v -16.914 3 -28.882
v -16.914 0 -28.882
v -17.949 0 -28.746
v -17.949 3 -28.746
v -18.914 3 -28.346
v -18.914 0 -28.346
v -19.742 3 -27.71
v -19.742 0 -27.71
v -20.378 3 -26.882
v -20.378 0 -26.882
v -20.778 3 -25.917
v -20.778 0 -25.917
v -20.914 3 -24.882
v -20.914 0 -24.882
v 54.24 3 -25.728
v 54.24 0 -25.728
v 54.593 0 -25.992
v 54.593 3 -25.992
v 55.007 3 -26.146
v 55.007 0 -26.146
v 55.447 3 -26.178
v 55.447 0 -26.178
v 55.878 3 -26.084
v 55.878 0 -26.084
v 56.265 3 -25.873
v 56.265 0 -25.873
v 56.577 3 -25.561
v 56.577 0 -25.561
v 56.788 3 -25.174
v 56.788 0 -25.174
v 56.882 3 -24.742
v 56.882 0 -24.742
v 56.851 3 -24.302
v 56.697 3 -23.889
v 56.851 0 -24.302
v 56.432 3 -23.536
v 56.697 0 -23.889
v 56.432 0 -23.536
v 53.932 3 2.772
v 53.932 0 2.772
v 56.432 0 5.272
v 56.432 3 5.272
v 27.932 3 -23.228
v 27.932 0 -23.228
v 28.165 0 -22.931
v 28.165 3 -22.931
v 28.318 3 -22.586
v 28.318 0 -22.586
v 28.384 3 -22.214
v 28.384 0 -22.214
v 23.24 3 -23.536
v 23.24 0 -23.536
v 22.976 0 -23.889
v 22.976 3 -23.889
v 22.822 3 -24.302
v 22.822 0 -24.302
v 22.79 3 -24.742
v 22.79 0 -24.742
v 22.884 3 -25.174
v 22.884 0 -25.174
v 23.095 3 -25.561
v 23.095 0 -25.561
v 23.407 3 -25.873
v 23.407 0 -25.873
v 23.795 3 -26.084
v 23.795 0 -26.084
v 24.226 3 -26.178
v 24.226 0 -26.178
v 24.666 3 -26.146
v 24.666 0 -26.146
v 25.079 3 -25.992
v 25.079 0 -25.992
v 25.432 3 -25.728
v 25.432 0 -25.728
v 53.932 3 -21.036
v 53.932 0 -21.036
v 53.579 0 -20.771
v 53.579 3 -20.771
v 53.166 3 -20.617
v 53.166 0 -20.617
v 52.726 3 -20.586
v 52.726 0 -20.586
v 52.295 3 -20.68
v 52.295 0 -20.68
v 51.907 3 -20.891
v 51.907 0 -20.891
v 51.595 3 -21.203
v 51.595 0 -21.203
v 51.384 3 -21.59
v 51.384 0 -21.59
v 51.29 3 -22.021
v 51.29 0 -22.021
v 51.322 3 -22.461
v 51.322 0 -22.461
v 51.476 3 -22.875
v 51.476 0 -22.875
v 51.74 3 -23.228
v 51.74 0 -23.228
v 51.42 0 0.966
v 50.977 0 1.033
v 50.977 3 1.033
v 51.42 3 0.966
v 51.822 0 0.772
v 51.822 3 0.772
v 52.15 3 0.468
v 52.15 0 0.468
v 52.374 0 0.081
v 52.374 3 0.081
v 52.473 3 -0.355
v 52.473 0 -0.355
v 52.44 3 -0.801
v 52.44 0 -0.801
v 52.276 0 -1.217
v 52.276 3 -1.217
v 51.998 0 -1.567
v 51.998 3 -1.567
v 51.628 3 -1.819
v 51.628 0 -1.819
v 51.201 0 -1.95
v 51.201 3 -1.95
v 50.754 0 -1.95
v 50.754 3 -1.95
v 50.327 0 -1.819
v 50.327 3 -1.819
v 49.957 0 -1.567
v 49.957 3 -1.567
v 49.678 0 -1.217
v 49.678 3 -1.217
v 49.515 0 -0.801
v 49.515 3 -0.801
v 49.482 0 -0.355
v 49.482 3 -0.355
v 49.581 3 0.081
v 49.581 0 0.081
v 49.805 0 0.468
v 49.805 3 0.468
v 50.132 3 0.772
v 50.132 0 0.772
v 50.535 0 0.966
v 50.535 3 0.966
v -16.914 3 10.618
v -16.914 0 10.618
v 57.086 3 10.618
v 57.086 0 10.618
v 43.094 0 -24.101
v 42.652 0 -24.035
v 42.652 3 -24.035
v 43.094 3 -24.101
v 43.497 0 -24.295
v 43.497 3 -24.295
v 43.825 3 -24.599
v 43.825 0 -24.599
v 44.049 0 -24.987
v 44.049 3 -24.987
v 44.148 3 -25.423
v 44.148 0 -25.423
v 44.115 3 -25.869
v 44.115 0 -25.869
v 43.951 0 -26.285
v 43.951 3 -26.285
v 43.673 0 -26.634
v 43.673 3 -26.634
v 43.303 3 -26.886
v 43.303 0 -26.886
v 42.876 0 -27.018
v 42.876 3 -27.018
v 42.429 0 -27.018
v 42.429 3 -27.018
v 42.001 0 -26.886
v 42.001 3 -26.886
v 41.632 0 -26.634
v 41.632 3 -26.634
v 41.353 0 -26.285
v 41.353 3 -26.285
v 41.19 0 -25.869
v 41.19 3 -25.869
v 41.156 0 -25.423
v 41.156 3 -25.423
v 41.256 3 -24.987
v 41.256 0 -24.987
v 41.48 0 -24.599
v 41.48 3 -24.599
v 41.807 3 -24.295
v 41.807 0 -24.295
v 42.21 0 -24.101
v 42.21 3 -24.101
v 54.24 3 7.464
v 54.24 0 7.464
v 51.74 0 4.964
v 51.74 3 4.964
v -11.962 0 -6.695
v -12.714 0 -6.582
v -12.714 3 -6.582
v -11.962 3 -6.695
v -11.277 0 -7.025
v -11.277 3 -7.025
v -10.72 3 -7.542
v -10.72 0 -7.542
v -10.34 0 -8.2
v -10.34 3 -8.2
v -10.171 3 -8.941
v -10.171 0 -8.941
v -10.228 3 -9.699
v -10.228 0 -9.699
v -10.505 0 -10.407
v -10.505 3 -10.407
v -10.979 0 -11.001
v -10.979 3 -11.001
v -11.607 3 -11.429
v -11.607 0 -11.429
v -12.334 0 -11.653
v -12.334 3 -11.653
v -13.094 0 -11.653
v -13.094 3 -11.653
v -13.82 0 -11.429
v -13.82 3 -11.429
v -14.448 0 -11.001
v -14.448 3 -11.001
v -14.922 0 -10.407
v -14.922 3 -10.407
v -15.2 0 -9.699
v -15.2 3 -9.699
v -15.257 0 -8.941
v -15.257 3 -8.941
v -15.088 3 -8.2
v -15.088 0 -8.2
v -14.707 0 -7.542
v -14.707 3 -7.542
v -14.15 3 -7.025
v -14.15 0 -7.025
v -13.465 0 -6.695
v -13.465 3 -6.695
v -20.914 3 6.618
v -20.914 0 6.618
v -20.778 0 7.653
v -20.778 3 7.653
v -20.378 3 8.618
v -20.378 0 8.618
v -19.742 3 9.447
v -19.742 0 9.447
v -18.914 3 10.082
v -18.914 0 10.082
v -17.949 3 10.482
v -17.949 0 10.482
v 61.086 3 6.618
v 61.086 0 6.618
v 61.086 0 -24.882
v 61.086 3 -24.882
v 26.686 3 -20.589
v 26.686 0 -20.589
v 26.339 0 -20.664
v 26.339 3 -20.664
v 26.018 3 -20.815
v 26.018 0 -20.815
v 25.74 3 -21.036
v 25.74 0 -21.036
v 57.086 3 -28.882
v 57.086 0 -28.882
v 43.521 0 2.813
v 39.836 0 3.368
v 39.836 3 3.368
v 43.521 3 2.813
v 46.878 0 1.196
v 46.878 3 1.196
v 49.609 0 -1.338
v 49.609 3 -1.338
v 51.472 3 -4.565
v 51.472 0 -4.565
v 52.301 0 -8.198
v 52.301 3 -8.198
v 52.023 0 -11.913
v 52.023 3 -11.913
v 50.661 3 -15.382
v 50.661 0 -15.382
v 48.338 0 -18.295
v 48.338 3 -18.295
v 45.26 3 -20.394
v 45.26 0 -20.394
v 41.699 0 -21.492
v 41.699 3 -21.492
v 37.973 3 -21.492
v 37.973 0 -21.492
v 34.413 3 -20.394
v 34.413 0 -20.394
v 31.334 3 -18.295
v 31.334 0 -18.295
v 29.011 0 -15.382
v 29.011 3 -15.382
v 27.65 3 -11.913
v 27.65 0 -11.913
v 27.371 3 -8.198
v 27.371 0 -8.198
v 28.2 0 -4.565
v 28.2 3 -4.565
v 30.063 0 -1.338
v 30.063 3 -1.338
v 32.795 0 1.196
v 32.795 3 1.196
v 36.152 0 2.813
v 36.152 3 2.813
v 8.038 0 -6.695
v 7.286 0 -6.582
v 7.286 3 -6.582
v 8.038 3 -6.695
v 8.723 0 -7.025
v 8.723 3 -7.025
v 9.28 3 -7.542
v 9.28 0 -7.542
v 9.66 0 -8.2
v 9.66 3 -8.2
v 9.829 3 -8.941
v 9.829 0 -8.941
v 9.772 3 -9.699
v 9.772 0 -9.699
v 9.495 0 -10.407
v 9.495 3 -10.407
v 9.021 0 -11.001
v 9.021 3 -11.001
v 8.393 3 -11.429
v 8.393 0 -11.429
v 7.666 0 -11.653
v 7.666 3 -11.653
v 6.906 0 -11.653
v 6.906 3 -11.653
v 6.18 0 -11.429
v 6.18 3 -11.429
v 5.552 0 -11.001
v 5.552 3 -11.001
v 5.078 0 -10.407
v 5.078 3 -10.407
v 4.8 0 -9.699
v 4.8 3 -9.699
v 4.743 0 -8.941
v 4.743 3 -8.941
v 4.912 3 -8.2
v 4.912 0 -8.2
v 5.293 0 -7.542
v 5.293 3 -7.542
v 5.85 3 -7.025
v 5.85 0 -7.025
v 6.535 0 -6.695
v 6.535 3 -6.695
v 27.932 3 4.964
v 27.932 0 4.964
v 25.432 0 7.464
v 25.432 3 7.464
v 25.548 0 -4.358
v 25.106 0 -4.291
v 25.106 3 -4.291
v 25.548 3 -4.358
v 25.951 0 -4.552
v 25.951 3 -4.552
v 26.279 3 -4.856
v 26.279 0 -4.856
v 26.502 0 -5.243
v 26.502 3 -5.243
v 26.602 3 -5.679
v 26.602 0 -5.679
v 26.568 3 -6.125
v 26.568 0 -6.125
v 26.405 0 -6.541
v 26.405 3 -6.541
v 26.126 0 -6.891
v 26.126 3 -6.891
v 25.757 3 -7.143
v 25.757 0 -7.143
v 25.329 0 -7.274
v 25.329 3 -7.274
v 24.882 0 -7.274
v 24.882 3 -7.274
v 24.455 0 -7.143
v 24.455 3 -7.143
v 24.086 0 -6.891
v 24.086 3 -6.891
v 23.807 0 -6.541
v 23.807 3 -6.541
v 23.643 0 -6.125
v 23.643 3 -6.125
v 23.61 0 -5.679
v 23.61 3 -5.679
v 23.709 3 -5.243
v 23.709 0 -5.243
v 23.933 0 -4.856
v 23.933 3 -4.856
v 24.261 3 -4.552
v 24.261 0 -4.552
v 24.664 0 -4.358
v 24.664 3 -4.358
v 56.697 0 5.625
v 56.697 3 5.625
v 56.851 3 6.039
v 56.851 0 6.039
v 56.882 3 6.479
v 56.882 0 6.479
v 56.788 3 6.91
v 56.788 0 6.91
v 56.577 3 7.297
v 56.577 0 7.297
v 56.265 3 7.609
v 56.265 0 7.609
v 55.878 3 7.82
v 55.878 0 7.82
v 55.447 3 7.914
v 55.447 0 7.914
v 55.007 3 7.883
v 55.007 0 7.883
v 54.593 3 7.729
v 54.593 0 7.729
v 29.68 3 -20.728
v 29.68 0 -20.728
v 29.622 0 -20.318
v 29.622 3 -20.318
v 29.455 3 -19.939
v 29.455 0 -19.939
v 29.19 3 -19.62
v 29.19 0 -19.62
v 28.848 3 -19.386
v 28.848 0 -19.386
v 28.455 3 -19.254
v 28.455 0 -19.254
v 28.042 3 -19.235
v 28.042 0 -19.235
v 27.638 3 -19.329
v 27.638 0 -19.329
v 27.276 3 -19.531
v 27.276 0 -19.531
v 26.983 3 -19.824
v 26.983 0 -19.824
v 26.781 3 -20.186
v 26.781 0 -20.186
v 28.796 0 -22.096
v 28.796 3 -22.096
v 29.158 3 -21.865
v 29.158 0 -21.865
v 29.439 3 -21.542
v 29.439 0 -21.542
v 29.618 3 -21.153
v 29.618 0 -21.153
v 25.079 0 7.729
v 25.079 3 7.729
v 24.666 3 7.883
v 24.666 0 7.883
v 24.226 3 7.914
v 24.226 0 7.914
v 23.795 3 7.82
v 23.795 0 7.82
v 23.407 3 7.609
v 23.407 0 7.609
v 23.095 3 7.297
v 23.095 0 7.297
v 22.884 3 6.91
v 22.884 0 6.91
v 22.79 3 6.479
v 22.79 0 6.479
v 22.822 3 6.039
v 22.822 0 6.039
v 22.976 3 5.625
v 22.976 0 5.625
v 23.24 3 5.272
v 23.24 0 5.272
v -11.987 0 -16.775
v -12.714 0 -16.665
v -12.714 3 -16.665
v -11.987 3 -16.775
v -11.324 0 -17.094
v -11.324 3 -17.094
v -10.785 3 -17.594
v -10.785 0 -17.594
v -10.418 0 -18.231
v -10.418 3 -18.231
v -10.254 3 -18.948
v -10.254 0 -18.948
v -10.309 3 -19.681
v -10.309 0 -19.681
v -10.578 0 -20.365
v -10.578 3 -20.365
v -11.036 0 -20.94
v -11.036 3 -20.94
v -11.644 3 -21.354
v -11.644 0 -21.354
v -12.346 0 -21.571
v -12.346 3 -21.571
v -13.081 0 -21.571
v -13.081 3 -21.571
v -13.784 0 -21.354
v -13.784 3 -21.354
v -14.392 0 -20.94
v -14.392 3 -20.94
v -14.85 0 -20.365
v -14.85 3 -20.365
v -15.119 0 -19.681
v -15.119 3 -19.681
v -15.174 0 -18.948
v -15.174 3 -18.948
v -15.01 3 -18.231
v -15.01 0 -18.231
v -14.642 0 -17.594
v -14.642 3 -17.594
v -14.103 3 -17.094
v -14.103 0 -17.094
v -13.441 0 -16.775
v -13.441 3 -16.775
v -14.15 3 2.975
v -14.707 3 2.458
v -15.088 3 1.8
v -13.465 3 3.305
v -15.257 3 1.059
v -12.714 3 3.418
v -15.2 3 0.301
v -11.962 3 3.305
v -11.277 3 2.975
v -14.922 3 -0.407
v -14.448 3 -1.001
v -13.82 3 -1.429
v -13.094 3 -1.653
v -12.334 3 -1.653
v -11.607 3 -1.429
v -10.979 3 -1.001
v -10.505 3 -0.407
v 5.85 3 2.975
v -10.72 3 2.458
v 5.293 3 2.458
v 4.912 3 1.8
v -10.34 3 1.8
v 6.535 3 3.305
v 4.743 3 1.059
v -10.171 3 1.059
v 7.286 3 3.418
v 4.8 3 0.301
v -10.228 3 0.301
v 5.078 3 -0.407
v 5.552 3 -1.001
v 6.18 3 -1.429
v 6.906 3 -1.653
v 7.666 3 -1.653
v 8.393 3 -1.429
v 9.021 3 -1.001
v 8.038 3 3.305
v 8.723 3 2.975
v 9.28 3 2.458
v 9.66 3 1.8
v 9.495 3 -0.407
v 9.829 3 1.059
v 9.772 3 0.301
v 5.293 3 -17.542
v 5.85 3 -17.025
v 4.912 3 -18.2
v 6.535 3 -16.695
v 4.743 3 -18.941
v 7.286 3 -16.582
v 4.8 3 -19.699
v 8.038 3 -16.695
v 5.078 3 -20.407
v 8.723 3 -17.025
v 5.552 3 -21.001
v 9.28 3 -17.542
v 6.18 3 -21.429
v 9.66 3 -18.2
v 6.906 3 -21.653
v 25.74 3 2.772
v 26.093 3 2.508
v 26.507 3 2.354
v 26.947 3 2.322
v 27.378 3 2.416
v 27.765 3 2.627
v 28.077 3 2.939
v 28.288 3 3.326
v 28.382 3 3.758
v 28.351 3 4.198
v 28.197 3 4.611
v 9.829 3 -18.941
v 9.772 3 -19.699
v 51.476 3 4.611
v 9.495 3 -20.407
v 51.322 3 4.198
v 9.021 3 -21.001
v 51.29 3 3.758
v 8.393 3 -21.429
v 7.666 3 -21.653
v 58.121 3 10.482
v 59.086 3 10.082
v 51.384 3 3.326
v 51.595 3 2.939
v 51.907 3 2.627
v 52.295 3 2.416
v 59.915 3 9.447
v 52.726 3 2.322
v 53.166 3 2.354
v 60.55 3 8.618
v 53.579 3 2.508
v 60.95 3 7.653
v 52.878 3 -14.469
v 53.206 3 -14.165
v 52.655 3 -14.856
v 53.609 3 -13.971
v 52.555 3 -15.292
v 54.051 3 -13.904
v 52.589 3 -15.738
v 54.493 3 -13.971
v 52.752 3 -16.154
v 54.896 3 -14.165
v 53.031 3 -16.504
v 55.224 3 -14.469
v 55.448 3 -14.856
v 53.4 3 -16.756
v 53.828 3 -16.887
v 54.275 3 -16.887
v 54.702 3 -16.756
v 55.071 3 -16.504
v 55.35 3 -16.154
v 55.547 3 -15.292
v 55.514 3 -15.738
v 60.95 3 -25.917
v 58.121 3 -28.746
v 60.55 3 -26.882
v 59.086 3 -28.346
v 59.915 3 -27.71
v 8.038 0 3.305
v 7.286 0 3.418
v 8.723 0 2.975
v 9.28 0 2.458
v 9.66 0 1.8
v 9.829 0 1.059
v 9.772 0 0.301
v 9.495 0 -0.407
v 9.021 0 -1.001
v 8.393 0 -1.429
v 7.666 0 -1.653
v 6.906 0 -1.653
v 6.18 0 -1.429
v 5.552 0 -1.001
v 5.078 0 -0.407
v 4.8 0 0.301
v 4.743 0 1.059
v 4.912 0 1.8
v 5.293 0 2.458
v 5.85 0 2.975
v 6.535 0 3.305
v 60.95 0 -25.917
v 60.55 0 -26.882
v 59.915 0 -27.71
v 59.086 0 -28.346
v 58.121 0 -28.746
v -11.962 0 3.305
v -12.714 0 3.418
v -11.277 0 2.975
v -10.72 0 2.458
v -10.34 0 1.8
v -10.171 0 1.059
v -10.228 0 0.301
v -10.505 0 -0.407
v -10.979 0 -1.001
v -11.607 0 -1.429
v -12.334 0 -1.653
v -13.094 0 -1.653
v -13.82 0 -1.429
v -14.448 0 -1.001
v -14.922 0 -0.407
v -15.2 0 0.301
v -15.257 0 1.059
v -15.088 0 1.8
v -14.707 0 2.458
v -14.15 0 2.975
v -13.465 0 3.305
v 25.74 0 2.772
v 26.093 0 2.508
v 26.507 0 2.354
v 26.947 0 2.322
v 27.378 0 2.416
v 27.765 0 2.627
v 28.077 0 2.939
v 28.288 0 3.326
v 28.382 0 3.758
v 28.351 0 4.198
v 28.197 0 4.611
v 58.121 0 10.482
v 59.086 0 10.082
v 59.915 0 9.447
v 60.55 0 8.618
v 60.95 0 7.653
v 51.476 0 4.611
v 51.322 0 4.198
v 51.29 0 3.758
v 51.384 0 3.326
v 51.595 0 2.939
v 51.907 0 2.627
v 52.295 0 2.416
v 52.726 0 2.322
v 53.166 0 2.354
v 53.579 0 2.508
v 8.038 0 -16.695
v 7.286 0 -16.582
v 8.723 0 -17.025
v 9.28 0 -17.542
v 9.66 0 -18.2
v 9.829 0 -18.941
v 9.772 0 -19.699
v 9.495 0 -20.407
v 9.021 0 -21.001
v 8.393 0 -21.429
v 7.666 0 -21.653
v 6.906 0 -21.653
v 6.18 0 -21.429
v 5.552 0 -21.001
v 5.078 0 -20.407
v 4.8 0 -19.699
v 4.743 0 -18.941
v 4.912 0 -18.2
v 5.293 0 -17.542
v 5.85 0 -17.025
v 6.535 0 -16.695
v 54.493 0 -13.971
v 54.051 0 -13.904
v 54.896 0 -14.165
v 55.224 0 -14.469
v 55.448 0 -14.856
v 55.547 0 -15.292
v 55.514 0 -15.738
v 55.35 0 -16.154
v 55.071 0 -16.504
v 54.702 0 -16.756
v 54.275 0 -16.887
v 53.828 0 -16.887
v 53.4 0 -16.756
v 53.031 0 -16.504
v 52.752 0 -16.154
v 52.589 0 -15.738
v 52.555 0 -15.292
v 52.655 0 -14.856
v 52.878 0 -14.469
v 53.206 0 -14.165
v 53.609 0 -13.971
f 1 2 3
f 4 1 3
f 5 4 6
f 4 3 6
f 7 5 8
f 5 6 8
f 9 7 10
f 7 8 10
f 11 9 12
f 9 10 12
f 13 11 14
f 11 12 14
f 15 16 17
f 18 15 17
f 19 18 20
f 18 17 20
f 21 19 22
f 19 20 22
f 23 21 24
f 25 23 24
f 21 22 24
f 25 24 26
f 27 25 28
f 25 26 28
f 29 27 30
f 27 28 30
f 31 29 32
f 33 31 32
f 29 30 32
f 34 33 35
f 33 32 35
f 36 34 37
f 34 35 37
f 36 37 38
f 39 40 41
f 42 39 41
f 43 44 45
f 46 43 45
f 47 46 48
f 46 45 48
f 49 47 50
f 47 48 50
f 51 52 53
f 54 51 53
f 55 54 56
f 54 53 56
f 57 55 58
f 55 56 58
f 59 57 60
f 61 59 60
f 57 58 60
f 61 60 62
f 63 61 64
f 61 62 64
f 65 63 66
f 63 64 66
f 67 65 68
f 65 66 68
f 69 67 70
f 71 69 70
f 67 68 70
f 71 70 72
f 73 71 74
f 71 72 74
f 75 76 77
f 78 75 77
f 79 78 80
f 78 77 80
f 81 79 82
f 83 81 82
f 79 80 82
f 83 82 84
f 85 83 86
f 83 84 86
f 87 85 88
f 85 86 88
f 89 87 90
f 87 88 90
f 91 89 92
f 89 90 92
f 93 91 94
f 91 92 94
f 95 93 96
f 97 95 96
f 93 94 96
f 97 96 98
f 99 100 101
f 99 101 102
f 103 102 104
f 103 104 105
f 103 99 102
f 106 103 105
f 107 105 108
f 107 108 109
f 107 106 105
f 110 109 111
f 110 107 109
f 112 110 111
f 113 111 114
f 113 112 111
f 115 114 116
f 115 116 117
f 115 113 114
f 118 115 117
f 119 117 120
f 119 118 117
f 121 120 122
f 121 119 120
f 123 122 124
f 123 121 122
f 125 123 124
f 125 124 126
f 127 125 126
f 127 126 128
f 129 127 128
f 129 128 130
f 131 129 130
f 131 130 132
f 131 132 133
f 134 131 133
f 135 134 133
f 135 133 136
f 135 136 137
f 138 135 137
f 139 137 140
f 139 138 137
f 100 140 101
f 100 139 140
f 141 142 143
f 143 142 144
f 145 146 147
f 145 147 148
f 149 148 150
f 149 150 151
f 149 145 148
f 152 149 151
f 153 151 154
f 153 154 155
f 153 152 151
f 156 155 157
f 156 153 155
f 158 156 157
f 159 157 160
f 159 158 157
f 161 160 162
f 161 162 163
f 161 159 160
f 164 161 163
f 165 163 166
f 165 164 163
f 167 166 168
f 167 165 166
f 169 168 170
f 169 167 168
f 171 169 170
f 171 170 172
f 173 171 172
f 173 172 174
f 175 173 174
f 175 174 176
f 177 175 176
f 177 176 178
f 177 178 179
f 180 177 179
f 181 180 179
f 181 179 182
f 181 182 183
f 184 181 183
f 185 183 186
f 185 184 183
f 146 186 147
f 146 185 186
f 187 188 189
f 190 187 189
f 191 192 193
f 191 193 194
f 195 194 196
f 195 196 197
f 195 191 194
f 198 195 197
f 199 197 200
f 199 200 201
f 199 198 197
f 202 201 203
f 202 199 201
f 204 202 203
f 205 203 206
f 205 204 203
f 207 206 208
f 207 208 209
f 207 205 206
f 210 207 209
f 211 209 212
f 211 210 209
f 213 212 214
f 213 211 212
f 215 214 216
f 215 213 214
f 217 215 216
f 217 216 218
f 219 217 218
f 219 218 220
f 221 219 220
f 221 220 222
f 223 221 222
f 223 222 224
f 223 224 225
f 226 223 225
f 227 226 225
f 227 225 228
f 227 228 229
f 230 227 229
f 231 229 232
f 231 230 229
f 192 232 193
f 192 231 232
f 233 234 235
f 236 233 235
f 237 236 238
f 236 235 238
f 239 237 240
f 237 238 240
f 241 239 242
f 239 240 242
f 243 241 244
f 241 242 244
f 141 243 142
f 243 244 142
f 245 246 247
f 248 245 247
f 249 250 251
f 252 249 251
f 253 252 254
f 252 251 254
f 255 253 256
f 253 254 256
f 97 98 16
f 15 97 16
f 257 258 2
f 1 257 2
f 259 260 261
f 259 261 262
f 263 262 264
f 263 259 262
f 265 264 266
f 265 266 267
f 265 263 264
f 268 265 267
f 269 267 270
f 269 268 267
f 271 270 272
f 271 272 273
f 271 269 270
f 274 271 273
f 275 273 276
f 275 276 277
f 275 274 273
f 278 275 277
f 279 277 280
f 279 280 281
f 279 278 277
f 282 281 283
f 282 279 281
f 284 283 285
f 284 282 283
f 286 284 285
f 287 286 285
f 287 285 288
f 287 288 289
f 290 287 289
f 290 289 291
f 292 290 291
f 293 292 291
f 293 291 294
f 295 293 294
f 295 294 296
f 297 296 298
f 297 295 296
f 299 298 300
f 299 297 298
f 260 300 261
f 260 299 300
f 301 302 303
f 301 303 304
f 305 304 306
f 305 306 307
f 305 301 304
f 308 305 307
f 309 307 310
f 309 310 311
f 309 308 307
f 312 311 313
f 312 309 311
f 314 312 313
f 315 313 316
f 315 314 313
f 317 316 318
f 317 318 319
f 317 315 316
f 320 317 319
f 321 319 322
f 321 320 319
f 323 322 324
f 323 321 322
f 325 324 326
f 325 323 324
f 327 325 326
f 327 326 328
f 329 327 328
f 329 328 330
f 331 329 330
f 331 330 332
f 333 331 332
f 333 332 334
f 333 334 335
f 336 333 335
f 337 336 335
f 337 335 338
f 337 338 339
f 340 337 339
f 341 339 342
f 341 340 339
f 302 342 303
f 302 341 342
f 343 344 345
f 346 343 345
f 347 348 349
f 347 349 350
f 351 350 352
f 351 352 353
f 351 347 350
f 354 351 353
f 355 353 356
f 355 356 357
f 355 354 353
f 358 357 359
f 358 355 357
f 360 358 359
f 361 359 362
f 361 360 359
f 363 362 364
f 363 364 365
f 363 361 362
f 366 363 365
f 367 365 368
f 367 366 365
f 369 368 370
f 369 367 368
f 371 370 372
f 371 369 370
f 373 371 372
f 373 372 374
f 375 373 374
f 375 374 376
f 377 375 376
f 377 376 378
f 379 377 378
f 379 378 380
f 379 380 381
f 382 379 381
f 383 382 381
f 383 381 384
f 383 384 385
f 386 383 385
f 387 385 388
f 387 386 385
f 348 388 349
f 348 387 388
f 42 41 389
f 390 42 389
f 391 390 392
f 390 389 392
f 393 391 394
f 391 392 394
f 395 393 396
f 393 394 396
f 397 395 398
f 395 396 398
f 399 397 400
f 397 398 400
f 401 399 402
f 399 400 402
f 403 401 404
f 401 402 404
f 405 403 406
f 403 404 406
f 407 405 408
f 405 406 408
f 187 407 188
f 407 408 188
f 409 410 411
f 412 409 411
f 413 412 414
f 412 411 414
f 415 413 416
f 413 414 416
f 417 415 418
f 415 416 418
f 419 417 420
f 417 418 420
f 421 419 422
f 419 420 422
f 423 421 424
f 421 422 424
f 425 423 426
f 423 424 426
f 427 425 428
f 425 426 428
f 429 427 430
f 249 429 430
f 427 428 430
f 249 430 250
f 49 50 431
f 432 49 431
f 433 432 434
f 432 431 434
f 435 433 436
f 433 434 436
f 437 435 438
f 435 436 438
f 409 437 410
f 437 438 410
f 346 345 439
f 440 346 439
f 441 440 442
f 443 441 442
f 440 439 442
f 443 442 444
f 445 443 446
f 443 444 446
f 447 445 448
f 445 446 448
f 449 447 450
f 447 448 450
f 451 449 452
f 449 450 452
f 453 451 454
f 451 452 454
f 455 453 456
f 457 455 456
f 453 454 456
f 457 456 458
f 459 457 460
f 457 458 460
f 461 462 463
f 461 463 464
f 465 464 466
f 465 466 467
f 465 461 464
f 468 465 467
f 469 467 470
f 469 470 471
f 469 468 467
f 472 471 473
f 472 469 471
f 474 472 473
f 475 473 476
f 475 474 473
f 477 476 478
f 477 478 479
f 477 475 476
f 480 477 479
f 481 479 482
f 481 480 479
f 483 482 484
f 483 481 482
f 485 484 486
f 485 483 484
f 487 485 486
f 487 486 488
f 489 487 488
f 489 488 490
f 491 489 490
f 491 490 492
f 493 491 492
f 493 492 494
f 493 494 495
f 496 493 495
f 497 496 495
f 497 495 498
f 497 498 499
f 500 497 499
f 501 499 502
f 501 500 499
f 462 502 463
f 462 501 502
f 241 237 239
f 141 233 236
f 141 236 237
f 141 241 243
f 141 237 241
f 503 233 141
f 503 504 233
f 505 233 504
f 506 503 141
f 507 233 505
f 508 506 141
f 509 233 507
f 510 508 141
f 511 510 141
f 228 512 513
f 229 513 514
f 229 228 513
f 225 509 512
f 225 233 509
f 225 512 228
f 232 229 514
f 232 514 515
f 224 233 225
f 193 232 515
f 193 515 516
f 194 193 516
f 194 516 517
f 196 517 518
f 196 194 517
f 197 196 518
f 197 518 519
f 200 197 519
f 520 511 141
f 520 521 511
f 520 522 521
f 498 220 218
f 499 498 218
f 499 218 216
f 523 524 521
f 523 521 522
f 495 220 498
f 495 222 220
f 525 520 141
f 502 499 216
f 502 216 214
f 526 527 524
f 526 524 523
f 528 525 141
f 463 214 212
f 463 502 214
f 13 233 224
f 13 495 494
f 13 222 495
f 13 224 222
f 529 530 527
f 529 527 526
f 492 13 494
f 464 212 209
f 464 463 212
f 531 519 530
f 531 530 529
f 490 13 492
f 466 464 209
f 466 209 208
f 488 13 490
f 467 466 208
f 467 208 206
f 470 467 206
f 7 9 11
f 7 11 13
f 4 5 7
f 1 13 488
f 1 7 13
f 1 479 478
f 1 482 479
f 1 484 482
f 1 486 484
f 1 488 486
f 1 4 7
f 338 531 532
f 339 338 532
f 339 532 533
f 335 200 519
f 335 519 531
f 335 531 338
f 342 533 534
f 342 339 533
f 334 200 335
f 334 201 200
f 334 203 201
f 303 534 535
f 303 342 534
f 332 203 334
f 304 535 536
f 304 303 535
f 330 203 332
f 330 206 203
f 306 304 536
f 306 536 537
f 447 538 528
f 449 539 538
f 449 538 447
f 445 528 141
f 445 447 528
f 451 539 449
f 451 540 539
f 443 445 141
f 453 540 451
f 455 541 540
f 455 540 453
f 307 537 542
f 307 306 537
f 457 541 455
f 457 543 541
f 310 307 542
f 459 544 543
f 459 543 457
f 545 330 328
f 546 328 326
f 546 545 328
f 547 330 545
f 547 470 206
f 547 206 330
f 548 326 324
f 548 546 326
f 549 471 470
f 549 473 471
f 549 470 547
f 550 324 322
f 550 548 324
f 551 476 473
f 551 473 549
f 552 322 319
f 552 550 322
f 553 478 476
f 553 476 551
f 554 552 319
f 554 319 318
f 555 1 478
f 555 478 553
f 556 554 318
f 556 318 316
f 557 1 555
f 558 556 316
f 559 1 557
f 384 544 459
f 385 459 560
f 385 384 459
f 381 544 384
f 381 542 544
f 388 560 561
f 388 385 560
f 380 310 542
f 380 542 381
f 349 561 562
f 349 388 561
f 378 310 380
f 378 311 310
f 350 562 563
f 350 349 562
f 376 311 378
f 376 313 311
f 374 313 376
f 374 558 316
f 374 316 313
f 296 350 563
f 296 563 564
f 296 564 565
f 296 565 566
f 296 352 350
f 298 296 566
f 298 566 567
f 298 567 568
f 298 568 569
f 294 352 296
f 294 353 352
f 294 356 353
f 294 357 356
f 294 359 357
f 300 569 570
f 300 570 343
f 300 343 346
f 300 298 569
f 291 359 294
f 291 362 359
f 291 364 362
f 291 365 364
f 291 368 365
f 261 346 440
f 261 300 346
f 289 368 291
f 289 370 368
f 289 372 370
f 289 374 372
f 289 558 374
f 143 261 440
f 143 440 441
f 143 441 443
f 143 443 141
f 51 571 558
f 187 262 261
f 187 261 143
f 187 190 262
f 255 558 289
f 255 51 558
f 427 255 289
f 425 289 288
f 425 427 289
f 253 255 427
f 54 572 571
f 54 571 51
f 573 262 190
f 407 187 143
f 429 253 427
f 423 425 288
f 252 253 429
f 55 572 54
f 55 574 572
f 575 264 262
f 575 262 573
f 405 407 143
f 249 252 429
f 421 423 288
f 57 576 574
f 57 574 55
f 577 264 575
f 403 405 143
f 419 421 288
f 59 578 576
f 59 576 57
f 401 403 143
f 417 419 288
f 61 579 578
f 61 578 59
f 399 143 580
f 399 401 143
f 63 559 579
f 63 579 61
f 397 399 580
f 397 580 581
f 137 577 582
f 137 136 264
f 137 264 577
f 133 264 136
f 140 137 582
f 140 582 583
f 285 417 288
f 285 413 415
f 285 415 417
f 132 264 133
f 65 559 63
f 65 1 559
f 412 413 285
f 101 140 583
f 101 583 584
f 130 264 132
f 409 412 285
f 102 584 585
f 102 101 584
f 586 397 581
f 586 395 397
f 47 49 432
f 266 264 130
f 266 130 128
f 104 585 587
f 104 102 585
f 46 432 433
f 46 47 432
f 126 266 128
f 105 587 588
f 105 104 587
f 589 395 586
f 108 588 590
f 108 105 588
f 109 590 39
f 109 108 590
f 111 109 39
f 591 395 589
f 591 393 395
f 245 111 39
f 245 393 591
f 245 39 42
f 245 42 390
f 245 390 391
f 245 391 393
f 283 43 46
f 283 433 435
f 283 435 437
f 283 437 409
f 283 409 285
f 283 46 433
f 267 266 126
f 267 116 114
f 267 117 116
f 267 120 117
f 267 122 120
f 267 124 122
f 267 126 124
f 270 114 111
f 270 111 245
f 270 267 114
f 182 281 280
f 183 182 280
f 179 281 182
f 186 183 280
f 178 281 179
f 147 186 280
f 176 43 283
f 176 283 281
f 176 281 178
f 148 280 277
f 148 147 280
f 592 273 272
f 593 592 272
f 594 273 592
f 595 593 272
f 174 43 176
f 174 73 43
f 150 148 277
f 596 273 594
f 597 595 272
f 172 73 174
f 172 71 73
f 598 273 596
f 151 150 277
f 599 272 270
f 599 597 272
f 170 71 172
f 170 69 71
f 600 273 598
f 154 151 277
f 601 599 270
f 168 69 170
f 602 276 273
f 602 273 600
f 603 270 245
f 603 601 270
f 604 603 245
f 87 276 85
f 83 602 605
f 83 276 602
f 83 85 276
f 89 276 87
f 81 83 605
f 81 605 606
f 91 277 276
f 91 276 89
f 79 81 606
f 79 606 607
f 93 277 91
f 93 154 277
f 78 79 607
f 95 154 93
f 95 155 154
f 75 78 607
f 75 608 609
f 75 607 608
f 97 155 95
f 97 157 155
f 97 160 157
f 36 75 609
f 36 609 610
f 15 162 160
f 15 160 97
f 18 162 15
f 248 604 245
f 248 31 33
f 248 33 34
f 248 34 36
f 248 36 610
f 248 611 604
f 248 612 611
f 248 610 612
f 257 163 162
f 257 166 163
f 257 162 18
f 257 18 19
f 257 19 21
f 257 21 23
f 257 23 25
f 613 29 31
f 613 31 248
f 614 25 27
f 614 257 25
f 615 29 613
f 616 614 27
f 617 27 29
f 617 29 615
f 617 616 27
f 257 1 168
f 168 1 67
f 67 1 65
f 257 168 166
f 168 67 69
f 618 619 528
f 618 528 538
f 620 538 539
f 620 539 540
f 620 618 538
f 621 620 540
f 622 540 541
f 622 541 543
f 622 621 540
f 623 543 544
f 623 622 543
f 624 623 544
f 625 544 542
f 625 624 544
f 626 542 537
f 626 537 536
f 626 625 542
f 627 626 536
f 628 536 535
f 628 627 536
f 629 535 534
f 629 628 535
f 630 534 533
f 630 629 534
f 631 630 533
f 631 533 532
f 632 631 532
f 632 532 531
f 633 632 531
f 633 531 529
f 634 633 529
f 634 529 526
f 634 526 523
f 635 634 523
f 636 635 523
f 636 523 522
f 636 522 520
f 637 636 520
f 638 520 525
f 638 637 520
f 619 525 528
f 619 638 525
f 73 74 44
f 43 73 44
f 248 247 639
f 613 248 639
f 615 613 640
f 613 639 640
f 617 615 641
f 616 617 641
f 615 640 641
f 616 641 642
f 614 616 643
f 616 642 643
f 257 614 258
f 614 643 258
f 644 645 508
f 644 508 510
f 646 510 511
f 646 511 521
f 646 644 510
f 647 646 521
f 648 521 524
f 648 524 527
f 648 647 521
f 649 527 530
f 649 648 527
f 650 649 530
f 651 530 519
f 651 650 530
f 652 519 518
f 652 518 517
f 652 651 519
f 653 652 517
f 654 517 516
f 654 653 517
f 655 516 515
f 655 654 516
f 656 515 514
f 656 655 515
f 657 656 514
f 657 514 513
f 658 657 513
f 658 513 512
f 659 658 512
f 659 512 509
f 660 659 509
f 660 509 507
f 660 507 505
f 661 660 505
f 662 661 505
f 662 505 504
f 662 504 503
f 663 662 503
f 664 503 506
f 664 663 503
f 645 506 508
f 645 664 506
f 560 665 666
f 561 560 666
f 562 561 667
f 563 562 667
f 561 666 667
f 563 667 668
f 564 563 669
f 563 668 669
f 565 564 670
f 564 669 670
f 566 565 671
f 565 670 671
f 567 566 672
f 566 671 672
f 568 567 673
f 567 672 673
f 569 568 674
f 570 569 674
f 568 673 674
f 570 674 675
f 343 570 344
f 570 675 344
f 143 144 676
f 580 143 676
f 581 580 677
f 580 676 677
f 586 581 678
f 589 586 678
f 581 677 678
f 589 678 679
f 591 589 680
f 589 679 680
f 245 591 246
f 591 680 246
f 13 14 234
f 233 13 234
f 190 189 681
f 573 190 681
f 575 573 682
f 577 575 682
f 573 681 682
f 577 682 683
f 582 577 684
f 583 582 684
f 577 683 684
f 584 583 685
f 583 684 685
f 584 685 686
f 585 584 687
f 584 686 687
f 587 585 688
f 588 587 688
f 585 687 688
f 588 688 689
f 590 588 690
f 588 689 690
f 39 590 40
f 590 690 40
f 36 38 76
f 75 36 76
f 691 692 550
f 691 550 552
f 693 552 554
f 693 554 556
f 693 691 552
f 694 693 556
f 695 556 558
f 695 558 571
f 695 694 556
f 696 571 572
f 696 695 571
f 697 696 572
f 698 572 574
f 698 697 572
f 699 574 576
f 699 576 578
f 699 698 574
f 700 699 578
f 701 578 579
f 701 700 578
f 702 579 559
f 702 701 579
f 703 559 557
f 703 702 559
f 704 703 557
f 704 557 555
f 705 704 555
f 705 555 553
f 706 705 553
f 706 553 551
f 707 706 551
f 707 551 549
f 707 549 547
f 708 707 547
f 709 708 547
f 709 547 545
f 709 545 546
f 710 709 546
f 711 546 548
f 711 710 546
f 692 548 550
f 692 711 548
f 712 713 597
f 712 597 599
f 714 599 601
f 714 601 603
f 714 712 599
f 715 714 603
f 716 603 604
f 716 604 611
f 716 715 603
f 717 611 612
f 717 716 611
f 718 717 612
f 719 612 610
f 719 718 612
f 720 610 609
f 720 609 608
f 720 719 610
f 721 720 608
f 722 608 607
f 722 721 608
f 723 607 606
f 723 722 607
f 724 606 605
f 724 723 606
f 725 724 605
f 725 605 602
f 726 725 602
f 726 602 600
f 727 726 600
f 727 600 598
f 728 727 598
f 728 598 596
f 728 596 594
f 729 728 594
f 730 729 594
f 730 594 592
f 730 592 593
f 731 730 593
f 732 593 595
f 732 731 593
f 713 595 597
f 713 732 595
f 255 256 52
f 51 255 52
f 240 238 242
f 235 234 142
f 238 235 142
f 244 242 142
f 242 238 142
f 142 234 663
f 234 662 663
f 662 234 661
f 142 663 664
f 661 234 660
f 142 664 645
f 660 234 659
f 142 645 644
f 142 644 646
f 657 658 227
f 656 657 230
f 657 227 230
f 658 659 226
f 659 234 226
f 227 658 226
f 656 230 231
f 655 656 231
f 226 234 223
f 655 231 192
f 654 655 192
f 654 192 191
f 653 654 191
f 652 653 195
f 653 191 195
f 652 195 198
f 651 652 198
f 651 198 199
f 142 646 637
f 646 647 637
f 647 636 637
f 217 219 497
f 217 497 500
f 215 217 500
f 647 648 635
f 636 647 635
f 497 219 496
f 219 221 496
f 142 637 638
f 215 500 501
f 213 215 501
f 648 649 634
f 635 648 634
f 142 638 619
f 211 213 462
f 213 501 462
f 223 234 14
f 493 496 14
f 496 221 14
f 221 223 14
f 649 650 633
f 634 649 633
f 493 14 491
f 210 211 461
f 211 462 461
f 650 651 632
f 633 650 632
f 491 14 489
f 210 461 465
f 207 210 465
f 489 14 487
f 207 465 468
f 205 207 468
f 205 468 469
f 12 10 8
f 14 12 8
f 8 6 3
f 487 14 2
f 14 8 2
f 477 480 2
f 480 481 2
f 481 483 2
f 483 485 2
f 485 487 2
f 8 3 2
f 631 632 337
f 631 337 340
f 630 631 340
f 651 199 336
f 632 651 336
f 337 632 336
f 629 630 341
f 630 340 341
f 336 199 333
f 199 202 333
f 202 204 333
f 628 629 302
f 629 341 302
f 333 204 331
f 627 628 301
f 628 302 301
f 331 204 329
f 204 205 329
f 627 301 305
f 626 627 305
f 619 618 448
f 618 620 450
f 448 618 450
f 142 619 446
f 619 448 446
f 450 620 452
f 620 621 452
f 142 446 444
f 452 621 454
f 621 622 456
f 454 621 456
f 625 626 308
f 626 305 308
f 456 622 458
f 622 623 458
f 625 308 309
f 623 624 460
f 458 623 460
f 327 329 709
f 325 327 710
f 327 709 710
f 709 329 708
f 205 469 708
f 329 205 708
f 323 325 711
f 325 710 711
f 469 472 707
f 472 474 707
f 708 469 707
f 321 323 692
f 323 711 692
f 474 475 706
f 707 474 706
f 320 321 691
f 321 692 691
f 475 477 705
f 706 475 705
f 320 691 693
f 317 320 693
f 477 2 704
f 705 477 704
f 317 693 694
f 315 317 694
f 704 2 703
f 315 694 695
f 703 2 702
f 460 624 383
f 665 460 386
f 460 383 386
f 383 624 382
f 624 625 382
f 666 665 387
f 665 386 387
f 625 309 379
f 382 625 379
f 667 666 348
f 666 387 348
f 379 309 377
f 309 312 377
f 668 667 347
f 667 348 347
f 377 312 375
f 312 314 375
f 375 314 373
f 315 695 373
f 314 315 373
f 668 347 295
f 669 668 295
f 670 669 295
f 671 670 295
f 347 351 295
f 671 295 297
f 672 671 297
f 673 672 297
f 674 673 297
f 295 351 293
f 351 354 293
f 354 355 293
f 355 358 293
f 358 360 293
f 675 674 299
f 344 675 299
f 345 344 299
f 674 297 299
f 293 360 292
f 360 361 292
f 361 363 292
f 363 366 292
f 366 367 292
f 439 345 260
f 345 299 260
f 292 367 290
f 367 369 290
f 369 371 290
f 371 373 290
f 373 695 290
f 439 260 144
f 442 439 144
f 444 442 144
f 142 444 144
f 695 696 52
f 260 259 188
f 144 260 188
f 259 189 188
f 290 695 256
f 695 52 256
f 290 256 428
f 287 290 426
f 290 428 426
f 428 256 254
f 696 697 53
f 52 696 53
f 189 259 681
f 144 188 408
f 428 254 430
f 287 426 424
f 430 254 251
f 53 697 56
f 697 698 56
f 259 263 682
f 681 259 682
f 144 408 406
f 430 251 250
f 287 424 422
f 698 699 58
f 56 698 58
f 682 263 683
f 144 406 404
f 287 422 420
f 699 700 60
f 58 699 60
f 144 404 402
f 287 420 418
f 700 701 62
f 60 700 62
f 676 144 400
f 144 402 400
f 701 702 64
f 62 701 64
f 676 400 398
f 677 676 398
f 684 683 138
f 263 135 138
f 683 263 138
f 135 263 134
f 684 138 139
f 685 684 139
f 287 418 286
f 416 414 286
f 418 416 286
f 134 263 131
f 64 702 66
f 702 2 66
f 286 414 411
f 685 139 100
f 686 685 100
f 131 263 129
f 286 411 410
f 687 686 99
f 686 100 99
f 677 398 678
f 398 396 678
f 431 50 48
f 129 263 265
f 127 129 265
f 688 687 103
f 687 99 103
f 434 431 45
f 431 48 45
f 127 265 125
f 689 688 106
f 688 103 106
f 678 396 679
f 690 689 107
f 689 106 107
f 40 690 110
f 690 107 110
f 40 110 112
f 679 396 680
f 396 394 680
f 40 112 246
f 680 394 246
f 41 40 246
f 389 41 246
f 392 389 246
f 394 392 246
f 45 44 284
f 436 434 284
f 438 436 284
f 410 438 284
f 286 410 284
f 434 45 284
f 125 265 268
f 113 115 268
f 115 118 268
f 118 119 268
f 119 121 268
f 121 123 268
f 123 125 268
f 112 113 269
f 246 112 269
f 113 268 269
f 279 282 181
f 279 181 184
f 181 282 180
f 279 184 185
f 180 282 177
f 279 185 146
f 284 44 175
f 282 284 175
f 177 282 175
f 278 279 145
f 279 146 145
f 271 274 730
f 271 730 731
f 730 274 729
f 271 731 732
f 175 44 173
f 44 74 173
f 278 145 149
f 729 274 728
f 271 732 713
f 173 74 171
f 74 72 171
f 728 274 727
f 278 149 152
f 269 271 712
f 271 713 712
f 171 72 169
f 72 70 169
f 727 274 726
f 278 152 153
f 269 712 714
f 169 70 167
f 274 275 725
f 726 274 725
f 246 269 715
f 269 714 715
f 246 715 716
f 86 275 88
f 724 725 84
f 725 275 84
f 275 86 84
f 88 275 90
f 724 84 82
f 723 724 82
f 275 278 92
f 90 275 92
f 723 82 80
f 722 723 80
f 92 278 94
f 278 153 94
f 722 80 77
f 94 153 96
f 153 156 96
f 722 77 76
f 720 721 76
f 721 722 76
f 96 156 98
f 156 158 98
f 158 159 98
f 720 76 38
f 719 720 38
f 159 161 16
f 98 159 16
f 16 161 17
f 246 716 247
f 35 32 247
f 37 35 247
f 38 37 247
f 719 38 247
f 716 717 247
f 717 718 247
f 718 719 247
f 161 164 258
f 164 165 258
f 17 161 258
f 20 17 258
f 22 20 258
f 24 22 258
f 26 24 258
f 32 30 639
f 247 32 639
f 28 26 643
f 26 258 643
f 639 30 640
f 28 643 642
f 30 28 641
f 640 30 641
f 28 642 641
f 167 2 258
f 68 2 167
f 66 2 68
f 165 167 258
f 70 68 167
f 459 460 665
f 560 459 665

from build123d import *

# Parameters (mm, degrees)
SKETCH1_R           = 2.55
SKETCH1_R_2         = 1.5
SKETCH1_R_3         = 12.5
SKETCH1_R_4         = 2.466704156
BOSS_EXTRUDE1_DEPTH = 3


with BuildPart() as part:
    # Sketch1 → Boss-Extrude1 (new body)
    with BuildSketch(Plane(origin=(0, 0, 0), x_dir=(1, 0, 0), z_dir=(0, 1, 0))):
        with BuildLine():
            Line((57.086176903, 28.881843054), (-16.913823097, 28.881843054))
            ThreePointArc((-16.913823097, 28.881843054), (-19.742250221, 27.710270179), (-20.913823097, 24.881843054))
            Line((-20.913823097, 24.881843054), (-20.913823097, -6.618156946))
            ThreePointArc((-20.913823097, -6.618156946), (-19.742250221, -9.44658407), (-16.913823097, -10.618156946))
            Line((-16.913823097, -10.618156946), (57.086176903, -10.618156946))
            ThreePointArc((57.086176903, -10.618156946), (59.914604028, -9.44658407), (61.086176903, -6.618156946))
            Line((61.086176903, -6.618156946), (61.086176903, 24.881843054))
            ThreePointArc((61.086176903, 24.881843054), (59.914604028, 27.710270179), (57.086176903, 28.881843054))
        make_face()
        with Locations(Location((-12.713823097, -0.868156946, 0), (0, 0, 270))):
            Circle(SKETCH1_R, mode=Mode.SUBTRACT)
        with Locations(Location((7.286176903, -0.868156946, 0), (0, 0, 270))):
            Circle(SKETCH1_R, mode=Mode.SUBTRACT)
        with Locations(Location((-12.713823097, 9.131843054, 0), (0, 0, 270))):
            Circle(SKETCH1_R, mode=Mode.SUBTRACT)
        with Locations(Location((7.286176903, 9.131843054, 0), (0, 0, 270))):
            Circle(SKETCH1_R, mode=Mode.SUBTRACT)
        with BuildLine():
            Line((27.932192414, -4.964172457), (25.432192414, -7.464172457))
            ThreePointArc((25.432192414, -7.464172457), (23.240161393, -7.464172457), (23.240161393, -5.272141435))
            Line((23.240161393, -5.272141435), (25.740161393, -2.772141435))
            ThreePointArc((25.740161393, -2.772141435), (27.932192414, -2.772141435), (27.932192414, -4.964172457))
        make_face(mode=Mode.SUBTRACT)
        with BuildLine():
            Line((53.932192414, -2.772141435), (56.432192414, -5.272141435))
            ThreePointArc((56.432192414, -5.272141435), (56.432192414, -7.464172457), (54.240161393, -7.464172457))
            Line((54.240161393, -7.464172457), (51.740161393, -4.964172457))
            ThreePointArc((51.740161393, -4.964172457), (51.740161393, -2.772141435), (53.932192414, -2.772141435))
        make_face(mode=Mode.SUBTRACT)
        with Locations(Location((25.105765127, 5.791209645, 0), (0, 0, 270))):
            Circle(SKETCH1_R_2, mode=Mode.SUBTRACT)
        with Locations(Location((39.836176903, 9.131843054, 0), (0, 0, 270))):
            Circle(SKETCH1_R_3, mode=Mode.SUBTRACT)
        with Locations(Location((50.977423293, 0.467225819, 0), (0, 0, 270))):
            Circle(SKETCH1_R_2, mode=Mode.SUBTRACT)
        with Locations(Location((-12.713823097, 19.131843054, 0), (0, 0, 270))):
            Circle(SKETCH1_R_4, mode=Mode.SUBTRACT)
        with Locations(Location((7.286176903, 19.131843054, 0), (0, 0, 270))):
            Circle(SKETCH1_R, mode=Mode.SUBTRACT)
        with Locations(Location((54.051226788, 15.404234625, 0), (0, 0, 270))):
            Circle(SKETCH1_R_2, mode=Mode.SUBTRACT)
        with BuildLine():
            Line((25.740161393, 21.035827543), (23.240161393, 23.535827543))
            ThreePointArc((23.240161393, 23.535827543), (23.240161393, 25.727858565), (25.432192414, 25.727858565))
            Line((25.432192414, 25.727858565), (27.932192414, 23.227858565))
            ThreePointArc((27.932192414, 23.227858565), (28.251915532, 22.762861387), (28.383986105, 22.214224337))
            ThreePointArc((28.383986105, 22.214224337), (29.31019372, 21.713960247), (29.679568623, 20.728218451))
            ThreePointArc((29.679568623, 20.728218451), (28.24918667, 19.22983488), (26.686030853, 20.5891324))
            ThreePointArc((26.686030853, 20.5891324), (26.174275251, 20.730277429), (25.740161393, 21.035827543))
        make_face(mode=Mode.SUBTRACT)
        with BuildLine():
            ThreePointArc((54.240161393, 25.727858565), (56.432192414, 25.727858565), (56.432192414, 23.535827543))
            Line((56.432192414, 23.535827543), (53.932192414, 21.035827543))
            ThreePointArc((53.932192414, 21.035827543), (51.740161393, 21.035827543), (51.740161393, 23.227858565))
            Line((51.740161393, 23.227858565), (54.240161393, 25.727858565))
        make_face(mode=Mode.SUBTRACT)
        with Locations(Location((42.652299453, 25.534730941, 0), (0, 0, 270))):
            Circle(SKETCH1_R_2, mode=Mode.SUBTRACT)
    extrude(amount=BOSS_EXTRUDE1_DEPTH)


solid = part.part
